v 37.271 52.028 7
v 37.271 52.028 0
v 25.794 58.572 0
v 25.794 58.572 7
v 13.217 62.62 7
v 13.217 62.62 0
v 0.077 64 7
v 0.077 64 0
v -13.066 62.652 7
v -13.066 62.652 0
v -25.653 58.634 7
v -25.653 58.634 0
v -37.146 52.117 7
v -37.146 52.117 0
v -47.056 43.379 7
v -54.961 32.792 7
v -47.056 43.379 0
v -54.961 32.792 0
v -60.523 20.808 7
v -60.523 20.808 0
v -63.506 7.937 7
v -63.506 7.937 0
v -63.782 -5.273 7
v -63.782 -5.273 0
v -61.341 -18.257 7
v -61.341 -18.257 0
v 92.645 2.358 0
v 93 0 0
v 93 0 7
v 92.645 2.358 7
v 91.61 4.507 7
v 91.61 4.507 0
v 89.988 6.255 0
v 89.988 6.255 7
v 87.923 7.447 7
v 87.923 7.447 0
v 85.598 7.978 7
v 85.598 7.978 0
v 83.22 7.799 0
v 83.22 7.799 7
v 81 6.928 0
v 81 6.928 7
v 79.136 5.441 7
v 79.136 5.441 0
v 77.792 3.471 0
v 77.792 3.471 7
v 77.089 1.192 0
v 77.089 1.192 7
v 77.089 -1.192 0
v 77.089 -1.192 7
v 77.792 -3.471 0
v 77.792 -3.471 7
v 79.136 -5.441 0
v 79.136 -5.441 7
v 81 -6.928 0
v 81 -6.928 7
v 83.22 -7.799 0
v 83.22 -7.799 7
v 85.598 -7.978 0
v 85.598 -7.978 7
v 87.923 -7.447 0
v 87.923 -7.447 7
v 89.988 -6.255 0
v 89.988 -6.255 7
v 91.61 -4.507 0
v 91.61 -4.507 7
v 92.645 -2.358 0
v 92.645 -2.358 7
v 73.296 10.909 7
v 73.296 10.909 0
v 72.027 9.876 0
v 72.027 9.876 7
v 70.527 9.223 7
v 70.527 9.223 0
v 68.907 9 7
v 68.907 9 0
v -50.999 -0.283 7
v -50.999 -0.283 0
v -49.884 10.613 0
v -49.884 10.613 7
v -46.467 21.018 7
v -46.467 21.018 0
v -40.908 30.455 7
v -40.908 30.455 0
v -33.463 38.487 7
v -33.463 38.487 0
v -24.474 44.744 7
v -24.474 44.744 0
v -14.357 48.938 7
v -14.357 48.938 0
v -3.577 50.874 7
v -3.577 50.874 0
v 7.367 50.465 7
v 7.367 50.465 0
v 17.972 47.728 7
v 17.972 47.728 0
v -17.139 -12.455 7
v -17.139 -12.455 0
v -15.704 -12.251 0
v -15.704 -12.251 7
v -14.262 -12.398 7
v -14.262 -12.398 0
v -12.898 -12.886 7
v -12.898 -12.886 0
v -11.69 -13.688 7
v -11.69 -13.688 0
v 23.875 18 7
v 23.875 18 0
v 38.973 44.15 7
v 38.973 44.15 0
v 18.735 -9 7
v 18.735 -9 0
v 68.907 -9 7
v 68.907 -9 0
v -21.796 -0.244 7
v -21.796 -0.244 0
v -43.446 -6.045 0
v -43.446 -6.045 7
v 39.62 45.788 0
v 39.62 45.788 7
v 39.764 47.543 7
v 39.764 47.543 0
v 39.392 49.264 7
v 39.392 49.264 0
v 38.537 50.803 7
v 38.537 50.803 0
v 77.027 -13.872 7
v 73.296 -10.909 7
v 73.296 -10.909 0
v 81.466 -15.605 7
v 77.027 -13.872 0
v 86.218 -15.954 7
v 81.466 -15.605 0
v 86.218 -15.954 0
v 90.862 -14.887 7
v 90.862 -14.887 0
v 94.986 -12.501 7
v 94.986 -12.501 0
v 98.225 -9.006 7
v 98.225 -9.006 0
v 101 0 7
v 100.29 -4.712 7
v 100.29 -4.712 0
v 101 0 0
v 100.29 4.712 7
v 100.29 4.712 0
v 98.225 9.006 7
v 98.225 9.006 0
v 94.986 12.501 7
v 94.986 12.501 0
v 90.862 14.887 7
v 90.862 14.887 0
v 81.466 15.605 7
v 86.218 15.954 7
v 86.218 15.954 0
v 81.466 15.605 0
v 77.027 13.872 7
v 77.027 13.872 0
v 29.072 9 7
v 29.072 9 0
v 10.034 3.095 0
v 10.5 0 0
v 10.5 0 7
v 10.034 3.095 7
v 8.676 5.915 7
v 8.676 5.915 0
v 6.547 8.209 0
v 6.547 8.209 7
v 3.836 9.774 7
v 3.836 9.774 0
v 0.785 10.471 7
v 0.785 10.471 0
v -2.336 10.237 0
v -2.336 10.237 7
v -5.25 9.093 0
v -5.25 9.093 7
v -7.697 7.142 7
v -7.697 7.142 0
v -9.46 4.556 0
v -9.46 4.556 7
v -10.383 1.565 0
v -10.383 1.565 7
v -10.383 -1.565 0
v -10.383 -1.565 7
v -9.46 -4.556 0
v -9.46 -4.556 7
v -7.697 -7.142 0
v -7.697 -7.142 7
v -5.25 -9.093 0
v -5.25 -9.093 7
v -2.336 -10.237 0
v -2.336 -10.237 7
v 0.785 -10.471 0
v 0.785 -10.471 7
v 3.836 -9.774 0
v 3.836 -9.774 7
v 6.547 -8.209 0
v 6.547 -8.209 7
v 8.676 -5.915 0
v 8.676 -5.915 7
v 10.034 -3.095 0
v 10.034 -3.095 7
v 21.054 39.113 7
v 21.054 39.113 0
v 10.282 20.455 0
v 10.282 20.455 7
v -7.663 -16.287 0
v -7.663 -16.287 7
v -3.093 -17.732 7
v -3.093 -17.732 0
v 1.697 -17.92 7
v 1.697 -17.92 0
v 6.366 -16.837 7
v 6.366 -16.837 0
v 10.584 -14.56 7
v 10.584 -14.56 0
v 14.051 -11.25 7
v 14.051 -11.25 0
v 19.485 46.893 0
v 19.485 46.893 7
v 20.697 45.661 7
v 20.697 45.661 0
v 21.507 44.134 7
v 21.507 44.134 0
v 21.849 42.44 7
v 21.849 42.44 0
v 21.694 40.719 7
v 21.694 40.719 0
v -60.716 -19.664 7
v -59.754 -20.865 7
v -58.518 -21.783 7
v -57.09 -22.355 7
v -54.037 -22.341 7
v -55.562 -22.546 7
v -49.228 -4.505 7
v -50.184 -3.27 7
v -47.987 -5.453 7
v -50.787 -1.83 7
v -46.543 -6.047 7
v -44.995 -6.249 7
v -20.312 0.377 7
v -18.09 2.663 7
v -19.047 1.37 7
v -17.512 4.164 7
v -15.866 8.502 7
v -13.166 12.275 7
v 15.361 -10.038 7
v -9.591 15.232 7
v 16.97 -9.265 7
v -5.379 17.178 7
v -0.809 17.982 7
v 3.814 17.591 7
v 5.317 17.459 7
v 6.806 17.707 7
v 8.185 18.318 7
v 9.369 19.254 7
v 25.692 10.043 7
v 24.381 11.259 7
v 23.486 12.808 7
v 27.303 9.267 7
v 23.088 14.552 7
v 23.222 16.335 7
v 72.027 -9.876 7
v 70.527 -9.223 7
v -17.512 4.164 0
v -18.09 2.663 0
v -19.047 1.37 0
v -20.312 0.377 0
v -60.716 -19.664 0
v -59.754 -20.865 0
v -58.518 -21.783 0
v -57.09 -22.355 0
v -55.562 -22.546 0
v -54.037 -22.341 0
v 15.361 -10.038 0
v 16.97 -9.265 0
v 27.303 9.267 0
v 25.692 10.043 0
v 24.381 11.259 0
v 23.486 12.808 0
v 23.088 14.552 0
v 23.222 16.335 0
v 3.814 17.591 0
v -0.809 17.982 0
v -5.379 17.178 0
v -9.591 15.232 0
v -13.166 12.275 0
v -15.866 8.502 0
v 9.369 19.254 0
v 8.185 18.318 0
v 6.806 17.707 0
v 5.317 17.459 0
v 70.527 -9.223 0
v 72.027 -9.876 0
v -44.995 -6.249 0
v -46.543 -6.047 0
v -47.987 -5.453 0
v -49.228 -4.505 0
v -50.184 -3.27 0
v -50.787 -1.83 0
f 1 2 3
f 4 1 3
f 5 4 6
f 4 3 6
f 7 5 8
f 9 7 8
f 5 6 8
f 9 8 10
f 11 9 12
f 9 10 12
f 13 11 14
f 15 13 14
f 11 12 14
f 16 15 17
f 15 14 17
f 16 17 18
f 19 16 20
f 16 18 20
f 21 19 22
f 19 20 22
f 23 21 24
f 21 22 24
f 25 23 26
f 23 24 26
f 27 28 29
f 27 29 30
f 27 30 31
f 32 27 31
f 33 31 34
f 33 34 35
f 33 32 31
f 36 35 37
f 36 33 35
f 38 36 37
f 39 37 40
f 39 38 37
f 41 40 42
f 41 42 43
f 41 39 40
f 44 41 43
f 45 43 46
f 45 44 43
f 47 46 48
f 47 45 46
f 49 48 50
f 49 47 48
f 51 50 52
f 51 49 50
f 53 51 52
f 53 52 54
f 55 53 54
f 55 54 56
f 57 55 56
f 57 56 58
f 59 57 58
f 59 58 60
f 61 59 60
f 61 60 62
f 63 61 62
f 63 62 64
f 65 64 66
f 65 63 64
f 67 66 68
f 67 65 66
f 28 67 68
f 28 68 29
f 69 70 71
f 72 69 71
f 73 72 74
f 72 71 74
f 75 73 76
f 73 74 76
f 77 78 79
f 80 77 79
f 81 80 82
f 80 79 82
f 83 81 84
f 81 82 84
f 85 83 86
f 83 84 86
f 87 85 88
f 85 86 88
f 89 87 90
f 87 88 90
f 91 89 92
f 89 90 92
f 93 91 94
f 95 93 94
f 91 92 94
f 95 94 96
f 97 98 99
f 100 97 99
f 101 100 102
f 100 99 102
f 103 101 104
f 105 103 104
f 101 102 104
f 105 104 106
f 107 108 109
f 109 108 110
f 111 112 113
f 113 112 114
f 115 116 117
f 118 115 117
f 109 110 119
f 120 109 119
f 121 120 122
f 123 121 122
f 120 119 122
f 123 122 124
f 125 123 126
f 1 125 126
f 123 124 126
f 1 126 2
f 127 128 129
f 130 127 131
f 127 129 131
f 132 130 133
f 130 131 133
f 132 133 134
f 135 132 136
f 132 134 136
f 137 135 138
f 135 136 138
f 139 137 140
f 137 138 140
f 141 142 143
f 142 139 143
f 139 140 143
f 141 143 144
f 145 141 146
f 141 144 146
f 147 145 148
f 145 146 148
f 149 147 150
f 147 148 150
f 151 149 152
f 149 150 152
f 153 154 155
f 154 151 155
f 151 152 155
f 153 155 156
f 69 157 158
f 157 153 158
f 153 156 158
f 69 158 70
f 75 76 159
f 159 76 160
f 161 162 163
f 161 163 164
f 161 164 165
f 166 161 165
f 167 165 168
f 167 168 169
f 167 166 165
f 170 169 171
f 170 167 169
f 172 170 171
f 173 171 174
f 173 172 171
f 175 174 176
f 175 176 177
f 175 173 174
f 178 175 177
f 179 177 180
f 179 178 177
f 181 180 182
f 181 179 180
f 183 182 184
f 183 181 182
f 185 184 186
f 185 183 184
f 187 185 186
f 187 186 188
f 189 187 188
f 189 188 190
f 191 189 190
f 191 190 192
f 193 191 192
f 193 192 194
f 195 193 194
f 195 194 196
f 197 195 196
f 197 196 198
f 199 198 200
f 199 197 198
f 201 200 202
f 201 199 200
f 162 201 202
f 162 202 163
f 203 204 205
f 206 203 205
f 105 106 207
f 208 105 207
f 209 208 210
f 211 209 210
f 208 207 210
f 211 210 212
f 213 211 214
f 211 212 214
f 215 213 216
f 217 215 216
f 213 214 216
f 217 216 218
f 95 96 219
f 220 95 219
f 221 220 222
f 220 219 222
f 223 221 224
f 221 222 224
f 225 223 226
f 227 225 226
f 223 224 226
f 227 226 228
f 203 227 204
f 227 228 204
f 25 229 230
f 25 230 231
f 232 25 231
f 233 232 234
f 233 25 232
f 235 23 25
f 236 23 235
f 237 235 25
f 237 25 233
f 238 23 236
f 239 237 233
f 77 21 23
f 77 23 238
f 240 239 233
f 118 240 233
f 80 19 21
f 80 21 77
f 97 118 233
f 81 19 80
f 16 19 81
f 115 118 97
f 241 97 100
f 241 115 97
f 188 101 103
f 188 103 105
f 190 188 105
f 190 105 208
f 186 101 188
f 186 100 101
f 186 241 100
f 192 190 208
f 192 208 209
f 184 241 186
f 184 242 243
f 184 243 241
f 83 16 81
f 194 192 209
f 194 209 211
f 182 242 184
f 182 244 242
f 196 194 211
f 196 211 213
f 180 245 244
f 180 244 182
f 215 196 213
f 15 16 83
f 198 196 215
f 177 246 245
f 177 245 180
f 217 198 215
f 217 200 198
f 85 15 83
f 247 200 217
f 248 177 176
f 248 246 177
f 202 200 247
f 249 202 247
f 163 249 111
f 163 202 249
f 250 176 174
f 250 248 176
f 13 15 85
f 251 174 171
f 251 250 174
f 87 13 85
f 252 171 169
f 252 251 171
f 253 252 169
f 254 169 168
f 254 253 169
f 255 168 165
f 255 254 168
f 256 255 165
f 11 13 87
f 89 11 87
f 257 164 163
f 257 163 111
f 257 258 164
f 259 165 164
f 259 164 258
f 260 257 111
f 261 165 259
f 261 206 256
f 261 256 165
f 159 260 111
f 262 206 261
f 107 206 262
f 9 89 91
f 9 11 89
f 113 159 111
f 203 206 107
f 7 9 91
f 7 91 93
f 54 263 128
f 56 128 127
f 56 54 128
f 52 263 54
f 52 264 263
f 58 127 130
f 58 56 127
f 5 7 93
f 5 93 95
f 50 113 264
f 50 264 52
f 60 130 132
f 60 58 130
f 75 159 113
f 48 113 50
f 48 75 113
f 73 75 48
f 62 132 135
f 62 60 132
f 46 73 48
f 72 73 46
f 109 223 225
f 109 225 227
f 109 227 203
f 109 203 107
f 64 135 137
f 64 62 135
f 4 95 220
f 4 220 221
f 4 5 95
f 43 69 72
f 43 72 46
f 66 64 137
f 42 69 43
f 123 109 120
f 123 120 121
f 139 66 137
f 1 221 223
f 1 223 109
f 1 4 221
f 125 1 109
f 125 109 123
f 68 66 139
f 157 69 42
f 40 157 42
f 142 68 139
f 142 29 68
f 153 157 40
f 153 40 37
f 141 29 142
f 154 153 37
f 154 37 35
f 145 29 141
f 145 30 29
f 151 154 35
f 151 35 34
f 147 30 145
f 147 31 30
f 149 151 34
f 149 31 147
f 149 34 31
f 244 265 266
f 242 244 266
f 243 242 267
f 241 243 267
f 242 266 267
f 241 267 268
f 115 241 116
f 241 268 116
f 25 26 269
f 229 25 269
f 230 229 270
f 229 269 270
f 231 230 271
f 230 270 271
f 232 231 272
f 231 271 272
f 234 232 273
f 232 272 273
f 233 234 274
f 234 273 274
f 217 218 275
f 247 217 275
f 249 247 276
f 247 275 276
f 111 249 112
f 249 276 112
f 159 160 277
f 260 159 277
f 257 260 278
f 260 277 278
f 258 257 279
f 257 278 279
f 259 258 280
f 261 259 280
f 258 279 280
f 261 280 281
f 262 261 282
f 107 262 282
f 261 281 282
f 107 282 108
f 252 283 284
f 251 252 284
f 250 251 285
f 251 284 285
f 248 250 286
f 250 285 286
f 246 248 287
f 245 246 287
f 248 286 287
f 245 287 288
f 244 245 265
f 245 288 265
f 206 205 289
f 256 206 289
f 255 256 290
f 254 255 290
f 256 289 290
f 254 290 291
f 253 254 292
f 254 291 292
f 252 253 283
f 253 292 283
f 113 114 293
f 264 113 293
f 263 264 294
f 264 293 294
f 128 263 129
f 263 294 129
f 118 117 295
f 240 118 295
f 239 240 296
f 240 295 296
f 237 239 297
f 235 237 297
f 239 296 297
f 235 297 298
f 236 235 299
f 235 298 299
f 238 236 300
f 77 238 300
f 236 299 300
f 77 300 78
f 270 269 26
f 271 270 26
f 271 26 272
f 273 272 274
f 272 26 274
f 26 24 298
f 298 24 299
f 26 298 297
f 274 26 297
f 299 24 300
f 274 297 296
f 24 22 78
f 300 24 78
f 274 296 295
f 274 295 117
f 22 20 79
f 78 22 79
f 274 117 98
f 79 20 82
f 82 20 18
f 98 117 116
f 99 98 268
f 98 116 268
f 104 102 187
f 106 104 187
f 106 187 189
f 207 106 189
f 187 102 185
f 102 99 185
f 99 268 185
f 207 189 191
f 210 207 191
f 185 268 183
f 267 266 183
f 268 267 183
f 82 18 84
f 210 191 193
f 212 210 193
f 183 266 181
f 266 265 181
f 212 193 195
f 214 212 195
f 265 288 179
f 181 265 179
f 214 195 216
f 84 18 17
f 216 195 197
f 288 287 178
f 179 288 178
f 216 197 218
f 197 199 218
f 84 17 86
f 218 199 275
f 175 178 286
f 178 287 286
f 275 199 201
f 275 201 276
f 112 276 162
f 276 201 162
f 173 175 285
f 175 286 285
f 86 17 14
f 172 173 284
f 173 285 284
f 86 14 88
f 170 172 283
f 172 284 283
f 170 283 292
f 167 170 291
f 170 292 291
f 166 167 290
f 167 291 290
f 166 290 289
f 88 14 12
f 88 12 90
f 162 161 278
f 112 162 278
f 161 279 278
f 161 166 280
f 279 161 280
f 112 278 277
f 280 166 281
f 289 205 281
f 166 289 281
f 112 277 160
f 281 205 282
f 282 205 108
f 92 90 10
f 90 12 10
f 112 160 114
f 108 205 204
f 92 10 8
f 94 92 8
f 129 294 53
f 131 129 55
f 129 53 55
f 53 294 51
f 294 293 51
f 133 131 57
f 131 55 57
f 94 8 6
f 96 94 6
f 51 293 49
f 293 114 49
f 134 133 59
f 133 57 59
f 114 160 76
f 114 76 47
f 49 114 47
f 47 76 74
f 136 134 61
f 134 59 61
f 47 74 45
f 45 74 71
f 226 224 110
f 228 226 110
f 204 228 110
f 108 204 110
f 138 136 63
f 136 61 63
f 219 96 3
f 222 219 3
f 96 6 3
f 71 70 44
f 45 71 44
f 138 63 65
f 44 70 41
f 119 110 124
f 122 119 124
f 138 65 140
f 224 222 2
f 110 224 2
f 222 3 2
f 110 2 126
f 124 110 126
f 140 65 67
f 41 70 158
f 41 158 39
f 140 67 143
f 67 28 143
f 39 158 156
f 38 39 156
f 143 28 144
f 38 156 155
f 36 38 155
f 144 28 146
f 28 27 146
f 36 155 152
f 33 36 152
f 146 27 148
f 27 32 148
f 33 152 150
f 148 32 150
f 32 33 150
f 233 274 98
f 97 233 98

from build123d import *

# Parameters (mm, degrees)
SZKIC1_R                    = 18
SZKIC1_R_2                  = 10.5
SZKIC1_R_3                  = 16
SZKIC1_R_4                  = 8
DODANIE_WYCI_GNI_CIE1_DEPTH = 7


with BuildPart() as part:
    # Szkic1 → Dodanie-wyciągnięcie1 (new body)
    # profile 1 of 3: a face of its own
    with BuildSketch(Plane.XY):
        with BuildLine():
            Line((68.906523061, 9), (29.071509826, 9))
            ThreePointArc((29.071509826, 9), (23.875357404, 12), (23.875357404, 18))
            Line((23.875357404, 18), (38.973056312, 44.149981587))
            ThreePointArc((38.973056312, 44.149981587), (39.641584345, 48.417073987), (37.271066361, 52.027565889))
            ThreePointArc((37.271066361, 52.027565889), (-37.146015536, 52.116921722), (-61.340613737, -18.257302823))
            ThreePointArc((-61.340613737, -18.257302823), (-58.51823129, -21.782574666), (-54.037016928, -22.341235641))
            Line((-54.037016928, -22.341235641), (-17.13928203, -12.454517373))
            ThreePointArc((-17.13928203, -12.454517373), (-14.262244941, -12.398004426), (-11.68977582, -13.687554248))
            ThreePointArc((-11.68977582, -13.687554248), (-17.112889149, -5.581131156), (-17.511771596, 4.163875068))
            ThreePointArc((-17.511771596, 4.163875068), (-19.046659036, 1.369774785), (-21.796114524, -0.243721533))
            Line((-21.796114524, -0.243721533), (-43.446394932, -6.044896685))
            ThreePointArc((-43.446394932, -6.044896685), (-48.638675969, -5.019562848), (-50.999217096, -0.282587291))
            ThreePointArc((-50.999217096, -0.282587291), (-29.136896009, 41.857392309), (17.972237006, 47.728384605))
            ThreePointArc((17.972237006, 47.728384605), (21.50727904, 44.134176714), (21.054008604, 39.113280534))
            Line((21.054008604, 39.113280534), (10.281653378, 20.455013964))
            ThreePointArc((10.281653378, 20.455013964), (7.514747752, 17.968780283), (3.814125716, 17.591260473))
            ThreePointArc((3.814125716, 17.591260473), (14.011678395, 11.299241946), (18, 0))
            ThreePointArc((18, 0), (16.984145827, -5.961441984), (14.051245496, -11.25))
            ThreePointArc((14.051245496, -11.25), (16.136917784, -9.591673087), (18.734993995, -9))
            Line((18.734993995, -9), (68.906523061, -9))
            ThreePointArc((68.906523061, -9), (71.299695166, -9.497934272), (73.295653135, -10.909090909))
            ThreePointArc((73.295653135, -10.909090909), (69, 0), (73.295653135, 10.909090909))
            ThreePointArc((73.295653135, 10.909090909), (71.299695166, 9.497934272), (68.906523061, 9))
        make_face()
    # profile 2 of 3: a face of its own
    with BuildSketch(Plane.XY):
        Circle(SZKIC1_R)
        Circle(SZKIC1_R_2, mode=Mode.SUBTRACT)
    # profile 3 of 3: a face of its own
    with BuildSketch(Plane.XY):
        with Locations((85, 0)):
            Circle(SZKIC1_R_3)
        with Locations((85, 0)):
            Circle(SZKIC1_R_4, mode=Mode.SUBTRACT)
    extrude(amount=DODANIE_WYCI_GNI_CIE1_DEPTH)


solid = part.part
